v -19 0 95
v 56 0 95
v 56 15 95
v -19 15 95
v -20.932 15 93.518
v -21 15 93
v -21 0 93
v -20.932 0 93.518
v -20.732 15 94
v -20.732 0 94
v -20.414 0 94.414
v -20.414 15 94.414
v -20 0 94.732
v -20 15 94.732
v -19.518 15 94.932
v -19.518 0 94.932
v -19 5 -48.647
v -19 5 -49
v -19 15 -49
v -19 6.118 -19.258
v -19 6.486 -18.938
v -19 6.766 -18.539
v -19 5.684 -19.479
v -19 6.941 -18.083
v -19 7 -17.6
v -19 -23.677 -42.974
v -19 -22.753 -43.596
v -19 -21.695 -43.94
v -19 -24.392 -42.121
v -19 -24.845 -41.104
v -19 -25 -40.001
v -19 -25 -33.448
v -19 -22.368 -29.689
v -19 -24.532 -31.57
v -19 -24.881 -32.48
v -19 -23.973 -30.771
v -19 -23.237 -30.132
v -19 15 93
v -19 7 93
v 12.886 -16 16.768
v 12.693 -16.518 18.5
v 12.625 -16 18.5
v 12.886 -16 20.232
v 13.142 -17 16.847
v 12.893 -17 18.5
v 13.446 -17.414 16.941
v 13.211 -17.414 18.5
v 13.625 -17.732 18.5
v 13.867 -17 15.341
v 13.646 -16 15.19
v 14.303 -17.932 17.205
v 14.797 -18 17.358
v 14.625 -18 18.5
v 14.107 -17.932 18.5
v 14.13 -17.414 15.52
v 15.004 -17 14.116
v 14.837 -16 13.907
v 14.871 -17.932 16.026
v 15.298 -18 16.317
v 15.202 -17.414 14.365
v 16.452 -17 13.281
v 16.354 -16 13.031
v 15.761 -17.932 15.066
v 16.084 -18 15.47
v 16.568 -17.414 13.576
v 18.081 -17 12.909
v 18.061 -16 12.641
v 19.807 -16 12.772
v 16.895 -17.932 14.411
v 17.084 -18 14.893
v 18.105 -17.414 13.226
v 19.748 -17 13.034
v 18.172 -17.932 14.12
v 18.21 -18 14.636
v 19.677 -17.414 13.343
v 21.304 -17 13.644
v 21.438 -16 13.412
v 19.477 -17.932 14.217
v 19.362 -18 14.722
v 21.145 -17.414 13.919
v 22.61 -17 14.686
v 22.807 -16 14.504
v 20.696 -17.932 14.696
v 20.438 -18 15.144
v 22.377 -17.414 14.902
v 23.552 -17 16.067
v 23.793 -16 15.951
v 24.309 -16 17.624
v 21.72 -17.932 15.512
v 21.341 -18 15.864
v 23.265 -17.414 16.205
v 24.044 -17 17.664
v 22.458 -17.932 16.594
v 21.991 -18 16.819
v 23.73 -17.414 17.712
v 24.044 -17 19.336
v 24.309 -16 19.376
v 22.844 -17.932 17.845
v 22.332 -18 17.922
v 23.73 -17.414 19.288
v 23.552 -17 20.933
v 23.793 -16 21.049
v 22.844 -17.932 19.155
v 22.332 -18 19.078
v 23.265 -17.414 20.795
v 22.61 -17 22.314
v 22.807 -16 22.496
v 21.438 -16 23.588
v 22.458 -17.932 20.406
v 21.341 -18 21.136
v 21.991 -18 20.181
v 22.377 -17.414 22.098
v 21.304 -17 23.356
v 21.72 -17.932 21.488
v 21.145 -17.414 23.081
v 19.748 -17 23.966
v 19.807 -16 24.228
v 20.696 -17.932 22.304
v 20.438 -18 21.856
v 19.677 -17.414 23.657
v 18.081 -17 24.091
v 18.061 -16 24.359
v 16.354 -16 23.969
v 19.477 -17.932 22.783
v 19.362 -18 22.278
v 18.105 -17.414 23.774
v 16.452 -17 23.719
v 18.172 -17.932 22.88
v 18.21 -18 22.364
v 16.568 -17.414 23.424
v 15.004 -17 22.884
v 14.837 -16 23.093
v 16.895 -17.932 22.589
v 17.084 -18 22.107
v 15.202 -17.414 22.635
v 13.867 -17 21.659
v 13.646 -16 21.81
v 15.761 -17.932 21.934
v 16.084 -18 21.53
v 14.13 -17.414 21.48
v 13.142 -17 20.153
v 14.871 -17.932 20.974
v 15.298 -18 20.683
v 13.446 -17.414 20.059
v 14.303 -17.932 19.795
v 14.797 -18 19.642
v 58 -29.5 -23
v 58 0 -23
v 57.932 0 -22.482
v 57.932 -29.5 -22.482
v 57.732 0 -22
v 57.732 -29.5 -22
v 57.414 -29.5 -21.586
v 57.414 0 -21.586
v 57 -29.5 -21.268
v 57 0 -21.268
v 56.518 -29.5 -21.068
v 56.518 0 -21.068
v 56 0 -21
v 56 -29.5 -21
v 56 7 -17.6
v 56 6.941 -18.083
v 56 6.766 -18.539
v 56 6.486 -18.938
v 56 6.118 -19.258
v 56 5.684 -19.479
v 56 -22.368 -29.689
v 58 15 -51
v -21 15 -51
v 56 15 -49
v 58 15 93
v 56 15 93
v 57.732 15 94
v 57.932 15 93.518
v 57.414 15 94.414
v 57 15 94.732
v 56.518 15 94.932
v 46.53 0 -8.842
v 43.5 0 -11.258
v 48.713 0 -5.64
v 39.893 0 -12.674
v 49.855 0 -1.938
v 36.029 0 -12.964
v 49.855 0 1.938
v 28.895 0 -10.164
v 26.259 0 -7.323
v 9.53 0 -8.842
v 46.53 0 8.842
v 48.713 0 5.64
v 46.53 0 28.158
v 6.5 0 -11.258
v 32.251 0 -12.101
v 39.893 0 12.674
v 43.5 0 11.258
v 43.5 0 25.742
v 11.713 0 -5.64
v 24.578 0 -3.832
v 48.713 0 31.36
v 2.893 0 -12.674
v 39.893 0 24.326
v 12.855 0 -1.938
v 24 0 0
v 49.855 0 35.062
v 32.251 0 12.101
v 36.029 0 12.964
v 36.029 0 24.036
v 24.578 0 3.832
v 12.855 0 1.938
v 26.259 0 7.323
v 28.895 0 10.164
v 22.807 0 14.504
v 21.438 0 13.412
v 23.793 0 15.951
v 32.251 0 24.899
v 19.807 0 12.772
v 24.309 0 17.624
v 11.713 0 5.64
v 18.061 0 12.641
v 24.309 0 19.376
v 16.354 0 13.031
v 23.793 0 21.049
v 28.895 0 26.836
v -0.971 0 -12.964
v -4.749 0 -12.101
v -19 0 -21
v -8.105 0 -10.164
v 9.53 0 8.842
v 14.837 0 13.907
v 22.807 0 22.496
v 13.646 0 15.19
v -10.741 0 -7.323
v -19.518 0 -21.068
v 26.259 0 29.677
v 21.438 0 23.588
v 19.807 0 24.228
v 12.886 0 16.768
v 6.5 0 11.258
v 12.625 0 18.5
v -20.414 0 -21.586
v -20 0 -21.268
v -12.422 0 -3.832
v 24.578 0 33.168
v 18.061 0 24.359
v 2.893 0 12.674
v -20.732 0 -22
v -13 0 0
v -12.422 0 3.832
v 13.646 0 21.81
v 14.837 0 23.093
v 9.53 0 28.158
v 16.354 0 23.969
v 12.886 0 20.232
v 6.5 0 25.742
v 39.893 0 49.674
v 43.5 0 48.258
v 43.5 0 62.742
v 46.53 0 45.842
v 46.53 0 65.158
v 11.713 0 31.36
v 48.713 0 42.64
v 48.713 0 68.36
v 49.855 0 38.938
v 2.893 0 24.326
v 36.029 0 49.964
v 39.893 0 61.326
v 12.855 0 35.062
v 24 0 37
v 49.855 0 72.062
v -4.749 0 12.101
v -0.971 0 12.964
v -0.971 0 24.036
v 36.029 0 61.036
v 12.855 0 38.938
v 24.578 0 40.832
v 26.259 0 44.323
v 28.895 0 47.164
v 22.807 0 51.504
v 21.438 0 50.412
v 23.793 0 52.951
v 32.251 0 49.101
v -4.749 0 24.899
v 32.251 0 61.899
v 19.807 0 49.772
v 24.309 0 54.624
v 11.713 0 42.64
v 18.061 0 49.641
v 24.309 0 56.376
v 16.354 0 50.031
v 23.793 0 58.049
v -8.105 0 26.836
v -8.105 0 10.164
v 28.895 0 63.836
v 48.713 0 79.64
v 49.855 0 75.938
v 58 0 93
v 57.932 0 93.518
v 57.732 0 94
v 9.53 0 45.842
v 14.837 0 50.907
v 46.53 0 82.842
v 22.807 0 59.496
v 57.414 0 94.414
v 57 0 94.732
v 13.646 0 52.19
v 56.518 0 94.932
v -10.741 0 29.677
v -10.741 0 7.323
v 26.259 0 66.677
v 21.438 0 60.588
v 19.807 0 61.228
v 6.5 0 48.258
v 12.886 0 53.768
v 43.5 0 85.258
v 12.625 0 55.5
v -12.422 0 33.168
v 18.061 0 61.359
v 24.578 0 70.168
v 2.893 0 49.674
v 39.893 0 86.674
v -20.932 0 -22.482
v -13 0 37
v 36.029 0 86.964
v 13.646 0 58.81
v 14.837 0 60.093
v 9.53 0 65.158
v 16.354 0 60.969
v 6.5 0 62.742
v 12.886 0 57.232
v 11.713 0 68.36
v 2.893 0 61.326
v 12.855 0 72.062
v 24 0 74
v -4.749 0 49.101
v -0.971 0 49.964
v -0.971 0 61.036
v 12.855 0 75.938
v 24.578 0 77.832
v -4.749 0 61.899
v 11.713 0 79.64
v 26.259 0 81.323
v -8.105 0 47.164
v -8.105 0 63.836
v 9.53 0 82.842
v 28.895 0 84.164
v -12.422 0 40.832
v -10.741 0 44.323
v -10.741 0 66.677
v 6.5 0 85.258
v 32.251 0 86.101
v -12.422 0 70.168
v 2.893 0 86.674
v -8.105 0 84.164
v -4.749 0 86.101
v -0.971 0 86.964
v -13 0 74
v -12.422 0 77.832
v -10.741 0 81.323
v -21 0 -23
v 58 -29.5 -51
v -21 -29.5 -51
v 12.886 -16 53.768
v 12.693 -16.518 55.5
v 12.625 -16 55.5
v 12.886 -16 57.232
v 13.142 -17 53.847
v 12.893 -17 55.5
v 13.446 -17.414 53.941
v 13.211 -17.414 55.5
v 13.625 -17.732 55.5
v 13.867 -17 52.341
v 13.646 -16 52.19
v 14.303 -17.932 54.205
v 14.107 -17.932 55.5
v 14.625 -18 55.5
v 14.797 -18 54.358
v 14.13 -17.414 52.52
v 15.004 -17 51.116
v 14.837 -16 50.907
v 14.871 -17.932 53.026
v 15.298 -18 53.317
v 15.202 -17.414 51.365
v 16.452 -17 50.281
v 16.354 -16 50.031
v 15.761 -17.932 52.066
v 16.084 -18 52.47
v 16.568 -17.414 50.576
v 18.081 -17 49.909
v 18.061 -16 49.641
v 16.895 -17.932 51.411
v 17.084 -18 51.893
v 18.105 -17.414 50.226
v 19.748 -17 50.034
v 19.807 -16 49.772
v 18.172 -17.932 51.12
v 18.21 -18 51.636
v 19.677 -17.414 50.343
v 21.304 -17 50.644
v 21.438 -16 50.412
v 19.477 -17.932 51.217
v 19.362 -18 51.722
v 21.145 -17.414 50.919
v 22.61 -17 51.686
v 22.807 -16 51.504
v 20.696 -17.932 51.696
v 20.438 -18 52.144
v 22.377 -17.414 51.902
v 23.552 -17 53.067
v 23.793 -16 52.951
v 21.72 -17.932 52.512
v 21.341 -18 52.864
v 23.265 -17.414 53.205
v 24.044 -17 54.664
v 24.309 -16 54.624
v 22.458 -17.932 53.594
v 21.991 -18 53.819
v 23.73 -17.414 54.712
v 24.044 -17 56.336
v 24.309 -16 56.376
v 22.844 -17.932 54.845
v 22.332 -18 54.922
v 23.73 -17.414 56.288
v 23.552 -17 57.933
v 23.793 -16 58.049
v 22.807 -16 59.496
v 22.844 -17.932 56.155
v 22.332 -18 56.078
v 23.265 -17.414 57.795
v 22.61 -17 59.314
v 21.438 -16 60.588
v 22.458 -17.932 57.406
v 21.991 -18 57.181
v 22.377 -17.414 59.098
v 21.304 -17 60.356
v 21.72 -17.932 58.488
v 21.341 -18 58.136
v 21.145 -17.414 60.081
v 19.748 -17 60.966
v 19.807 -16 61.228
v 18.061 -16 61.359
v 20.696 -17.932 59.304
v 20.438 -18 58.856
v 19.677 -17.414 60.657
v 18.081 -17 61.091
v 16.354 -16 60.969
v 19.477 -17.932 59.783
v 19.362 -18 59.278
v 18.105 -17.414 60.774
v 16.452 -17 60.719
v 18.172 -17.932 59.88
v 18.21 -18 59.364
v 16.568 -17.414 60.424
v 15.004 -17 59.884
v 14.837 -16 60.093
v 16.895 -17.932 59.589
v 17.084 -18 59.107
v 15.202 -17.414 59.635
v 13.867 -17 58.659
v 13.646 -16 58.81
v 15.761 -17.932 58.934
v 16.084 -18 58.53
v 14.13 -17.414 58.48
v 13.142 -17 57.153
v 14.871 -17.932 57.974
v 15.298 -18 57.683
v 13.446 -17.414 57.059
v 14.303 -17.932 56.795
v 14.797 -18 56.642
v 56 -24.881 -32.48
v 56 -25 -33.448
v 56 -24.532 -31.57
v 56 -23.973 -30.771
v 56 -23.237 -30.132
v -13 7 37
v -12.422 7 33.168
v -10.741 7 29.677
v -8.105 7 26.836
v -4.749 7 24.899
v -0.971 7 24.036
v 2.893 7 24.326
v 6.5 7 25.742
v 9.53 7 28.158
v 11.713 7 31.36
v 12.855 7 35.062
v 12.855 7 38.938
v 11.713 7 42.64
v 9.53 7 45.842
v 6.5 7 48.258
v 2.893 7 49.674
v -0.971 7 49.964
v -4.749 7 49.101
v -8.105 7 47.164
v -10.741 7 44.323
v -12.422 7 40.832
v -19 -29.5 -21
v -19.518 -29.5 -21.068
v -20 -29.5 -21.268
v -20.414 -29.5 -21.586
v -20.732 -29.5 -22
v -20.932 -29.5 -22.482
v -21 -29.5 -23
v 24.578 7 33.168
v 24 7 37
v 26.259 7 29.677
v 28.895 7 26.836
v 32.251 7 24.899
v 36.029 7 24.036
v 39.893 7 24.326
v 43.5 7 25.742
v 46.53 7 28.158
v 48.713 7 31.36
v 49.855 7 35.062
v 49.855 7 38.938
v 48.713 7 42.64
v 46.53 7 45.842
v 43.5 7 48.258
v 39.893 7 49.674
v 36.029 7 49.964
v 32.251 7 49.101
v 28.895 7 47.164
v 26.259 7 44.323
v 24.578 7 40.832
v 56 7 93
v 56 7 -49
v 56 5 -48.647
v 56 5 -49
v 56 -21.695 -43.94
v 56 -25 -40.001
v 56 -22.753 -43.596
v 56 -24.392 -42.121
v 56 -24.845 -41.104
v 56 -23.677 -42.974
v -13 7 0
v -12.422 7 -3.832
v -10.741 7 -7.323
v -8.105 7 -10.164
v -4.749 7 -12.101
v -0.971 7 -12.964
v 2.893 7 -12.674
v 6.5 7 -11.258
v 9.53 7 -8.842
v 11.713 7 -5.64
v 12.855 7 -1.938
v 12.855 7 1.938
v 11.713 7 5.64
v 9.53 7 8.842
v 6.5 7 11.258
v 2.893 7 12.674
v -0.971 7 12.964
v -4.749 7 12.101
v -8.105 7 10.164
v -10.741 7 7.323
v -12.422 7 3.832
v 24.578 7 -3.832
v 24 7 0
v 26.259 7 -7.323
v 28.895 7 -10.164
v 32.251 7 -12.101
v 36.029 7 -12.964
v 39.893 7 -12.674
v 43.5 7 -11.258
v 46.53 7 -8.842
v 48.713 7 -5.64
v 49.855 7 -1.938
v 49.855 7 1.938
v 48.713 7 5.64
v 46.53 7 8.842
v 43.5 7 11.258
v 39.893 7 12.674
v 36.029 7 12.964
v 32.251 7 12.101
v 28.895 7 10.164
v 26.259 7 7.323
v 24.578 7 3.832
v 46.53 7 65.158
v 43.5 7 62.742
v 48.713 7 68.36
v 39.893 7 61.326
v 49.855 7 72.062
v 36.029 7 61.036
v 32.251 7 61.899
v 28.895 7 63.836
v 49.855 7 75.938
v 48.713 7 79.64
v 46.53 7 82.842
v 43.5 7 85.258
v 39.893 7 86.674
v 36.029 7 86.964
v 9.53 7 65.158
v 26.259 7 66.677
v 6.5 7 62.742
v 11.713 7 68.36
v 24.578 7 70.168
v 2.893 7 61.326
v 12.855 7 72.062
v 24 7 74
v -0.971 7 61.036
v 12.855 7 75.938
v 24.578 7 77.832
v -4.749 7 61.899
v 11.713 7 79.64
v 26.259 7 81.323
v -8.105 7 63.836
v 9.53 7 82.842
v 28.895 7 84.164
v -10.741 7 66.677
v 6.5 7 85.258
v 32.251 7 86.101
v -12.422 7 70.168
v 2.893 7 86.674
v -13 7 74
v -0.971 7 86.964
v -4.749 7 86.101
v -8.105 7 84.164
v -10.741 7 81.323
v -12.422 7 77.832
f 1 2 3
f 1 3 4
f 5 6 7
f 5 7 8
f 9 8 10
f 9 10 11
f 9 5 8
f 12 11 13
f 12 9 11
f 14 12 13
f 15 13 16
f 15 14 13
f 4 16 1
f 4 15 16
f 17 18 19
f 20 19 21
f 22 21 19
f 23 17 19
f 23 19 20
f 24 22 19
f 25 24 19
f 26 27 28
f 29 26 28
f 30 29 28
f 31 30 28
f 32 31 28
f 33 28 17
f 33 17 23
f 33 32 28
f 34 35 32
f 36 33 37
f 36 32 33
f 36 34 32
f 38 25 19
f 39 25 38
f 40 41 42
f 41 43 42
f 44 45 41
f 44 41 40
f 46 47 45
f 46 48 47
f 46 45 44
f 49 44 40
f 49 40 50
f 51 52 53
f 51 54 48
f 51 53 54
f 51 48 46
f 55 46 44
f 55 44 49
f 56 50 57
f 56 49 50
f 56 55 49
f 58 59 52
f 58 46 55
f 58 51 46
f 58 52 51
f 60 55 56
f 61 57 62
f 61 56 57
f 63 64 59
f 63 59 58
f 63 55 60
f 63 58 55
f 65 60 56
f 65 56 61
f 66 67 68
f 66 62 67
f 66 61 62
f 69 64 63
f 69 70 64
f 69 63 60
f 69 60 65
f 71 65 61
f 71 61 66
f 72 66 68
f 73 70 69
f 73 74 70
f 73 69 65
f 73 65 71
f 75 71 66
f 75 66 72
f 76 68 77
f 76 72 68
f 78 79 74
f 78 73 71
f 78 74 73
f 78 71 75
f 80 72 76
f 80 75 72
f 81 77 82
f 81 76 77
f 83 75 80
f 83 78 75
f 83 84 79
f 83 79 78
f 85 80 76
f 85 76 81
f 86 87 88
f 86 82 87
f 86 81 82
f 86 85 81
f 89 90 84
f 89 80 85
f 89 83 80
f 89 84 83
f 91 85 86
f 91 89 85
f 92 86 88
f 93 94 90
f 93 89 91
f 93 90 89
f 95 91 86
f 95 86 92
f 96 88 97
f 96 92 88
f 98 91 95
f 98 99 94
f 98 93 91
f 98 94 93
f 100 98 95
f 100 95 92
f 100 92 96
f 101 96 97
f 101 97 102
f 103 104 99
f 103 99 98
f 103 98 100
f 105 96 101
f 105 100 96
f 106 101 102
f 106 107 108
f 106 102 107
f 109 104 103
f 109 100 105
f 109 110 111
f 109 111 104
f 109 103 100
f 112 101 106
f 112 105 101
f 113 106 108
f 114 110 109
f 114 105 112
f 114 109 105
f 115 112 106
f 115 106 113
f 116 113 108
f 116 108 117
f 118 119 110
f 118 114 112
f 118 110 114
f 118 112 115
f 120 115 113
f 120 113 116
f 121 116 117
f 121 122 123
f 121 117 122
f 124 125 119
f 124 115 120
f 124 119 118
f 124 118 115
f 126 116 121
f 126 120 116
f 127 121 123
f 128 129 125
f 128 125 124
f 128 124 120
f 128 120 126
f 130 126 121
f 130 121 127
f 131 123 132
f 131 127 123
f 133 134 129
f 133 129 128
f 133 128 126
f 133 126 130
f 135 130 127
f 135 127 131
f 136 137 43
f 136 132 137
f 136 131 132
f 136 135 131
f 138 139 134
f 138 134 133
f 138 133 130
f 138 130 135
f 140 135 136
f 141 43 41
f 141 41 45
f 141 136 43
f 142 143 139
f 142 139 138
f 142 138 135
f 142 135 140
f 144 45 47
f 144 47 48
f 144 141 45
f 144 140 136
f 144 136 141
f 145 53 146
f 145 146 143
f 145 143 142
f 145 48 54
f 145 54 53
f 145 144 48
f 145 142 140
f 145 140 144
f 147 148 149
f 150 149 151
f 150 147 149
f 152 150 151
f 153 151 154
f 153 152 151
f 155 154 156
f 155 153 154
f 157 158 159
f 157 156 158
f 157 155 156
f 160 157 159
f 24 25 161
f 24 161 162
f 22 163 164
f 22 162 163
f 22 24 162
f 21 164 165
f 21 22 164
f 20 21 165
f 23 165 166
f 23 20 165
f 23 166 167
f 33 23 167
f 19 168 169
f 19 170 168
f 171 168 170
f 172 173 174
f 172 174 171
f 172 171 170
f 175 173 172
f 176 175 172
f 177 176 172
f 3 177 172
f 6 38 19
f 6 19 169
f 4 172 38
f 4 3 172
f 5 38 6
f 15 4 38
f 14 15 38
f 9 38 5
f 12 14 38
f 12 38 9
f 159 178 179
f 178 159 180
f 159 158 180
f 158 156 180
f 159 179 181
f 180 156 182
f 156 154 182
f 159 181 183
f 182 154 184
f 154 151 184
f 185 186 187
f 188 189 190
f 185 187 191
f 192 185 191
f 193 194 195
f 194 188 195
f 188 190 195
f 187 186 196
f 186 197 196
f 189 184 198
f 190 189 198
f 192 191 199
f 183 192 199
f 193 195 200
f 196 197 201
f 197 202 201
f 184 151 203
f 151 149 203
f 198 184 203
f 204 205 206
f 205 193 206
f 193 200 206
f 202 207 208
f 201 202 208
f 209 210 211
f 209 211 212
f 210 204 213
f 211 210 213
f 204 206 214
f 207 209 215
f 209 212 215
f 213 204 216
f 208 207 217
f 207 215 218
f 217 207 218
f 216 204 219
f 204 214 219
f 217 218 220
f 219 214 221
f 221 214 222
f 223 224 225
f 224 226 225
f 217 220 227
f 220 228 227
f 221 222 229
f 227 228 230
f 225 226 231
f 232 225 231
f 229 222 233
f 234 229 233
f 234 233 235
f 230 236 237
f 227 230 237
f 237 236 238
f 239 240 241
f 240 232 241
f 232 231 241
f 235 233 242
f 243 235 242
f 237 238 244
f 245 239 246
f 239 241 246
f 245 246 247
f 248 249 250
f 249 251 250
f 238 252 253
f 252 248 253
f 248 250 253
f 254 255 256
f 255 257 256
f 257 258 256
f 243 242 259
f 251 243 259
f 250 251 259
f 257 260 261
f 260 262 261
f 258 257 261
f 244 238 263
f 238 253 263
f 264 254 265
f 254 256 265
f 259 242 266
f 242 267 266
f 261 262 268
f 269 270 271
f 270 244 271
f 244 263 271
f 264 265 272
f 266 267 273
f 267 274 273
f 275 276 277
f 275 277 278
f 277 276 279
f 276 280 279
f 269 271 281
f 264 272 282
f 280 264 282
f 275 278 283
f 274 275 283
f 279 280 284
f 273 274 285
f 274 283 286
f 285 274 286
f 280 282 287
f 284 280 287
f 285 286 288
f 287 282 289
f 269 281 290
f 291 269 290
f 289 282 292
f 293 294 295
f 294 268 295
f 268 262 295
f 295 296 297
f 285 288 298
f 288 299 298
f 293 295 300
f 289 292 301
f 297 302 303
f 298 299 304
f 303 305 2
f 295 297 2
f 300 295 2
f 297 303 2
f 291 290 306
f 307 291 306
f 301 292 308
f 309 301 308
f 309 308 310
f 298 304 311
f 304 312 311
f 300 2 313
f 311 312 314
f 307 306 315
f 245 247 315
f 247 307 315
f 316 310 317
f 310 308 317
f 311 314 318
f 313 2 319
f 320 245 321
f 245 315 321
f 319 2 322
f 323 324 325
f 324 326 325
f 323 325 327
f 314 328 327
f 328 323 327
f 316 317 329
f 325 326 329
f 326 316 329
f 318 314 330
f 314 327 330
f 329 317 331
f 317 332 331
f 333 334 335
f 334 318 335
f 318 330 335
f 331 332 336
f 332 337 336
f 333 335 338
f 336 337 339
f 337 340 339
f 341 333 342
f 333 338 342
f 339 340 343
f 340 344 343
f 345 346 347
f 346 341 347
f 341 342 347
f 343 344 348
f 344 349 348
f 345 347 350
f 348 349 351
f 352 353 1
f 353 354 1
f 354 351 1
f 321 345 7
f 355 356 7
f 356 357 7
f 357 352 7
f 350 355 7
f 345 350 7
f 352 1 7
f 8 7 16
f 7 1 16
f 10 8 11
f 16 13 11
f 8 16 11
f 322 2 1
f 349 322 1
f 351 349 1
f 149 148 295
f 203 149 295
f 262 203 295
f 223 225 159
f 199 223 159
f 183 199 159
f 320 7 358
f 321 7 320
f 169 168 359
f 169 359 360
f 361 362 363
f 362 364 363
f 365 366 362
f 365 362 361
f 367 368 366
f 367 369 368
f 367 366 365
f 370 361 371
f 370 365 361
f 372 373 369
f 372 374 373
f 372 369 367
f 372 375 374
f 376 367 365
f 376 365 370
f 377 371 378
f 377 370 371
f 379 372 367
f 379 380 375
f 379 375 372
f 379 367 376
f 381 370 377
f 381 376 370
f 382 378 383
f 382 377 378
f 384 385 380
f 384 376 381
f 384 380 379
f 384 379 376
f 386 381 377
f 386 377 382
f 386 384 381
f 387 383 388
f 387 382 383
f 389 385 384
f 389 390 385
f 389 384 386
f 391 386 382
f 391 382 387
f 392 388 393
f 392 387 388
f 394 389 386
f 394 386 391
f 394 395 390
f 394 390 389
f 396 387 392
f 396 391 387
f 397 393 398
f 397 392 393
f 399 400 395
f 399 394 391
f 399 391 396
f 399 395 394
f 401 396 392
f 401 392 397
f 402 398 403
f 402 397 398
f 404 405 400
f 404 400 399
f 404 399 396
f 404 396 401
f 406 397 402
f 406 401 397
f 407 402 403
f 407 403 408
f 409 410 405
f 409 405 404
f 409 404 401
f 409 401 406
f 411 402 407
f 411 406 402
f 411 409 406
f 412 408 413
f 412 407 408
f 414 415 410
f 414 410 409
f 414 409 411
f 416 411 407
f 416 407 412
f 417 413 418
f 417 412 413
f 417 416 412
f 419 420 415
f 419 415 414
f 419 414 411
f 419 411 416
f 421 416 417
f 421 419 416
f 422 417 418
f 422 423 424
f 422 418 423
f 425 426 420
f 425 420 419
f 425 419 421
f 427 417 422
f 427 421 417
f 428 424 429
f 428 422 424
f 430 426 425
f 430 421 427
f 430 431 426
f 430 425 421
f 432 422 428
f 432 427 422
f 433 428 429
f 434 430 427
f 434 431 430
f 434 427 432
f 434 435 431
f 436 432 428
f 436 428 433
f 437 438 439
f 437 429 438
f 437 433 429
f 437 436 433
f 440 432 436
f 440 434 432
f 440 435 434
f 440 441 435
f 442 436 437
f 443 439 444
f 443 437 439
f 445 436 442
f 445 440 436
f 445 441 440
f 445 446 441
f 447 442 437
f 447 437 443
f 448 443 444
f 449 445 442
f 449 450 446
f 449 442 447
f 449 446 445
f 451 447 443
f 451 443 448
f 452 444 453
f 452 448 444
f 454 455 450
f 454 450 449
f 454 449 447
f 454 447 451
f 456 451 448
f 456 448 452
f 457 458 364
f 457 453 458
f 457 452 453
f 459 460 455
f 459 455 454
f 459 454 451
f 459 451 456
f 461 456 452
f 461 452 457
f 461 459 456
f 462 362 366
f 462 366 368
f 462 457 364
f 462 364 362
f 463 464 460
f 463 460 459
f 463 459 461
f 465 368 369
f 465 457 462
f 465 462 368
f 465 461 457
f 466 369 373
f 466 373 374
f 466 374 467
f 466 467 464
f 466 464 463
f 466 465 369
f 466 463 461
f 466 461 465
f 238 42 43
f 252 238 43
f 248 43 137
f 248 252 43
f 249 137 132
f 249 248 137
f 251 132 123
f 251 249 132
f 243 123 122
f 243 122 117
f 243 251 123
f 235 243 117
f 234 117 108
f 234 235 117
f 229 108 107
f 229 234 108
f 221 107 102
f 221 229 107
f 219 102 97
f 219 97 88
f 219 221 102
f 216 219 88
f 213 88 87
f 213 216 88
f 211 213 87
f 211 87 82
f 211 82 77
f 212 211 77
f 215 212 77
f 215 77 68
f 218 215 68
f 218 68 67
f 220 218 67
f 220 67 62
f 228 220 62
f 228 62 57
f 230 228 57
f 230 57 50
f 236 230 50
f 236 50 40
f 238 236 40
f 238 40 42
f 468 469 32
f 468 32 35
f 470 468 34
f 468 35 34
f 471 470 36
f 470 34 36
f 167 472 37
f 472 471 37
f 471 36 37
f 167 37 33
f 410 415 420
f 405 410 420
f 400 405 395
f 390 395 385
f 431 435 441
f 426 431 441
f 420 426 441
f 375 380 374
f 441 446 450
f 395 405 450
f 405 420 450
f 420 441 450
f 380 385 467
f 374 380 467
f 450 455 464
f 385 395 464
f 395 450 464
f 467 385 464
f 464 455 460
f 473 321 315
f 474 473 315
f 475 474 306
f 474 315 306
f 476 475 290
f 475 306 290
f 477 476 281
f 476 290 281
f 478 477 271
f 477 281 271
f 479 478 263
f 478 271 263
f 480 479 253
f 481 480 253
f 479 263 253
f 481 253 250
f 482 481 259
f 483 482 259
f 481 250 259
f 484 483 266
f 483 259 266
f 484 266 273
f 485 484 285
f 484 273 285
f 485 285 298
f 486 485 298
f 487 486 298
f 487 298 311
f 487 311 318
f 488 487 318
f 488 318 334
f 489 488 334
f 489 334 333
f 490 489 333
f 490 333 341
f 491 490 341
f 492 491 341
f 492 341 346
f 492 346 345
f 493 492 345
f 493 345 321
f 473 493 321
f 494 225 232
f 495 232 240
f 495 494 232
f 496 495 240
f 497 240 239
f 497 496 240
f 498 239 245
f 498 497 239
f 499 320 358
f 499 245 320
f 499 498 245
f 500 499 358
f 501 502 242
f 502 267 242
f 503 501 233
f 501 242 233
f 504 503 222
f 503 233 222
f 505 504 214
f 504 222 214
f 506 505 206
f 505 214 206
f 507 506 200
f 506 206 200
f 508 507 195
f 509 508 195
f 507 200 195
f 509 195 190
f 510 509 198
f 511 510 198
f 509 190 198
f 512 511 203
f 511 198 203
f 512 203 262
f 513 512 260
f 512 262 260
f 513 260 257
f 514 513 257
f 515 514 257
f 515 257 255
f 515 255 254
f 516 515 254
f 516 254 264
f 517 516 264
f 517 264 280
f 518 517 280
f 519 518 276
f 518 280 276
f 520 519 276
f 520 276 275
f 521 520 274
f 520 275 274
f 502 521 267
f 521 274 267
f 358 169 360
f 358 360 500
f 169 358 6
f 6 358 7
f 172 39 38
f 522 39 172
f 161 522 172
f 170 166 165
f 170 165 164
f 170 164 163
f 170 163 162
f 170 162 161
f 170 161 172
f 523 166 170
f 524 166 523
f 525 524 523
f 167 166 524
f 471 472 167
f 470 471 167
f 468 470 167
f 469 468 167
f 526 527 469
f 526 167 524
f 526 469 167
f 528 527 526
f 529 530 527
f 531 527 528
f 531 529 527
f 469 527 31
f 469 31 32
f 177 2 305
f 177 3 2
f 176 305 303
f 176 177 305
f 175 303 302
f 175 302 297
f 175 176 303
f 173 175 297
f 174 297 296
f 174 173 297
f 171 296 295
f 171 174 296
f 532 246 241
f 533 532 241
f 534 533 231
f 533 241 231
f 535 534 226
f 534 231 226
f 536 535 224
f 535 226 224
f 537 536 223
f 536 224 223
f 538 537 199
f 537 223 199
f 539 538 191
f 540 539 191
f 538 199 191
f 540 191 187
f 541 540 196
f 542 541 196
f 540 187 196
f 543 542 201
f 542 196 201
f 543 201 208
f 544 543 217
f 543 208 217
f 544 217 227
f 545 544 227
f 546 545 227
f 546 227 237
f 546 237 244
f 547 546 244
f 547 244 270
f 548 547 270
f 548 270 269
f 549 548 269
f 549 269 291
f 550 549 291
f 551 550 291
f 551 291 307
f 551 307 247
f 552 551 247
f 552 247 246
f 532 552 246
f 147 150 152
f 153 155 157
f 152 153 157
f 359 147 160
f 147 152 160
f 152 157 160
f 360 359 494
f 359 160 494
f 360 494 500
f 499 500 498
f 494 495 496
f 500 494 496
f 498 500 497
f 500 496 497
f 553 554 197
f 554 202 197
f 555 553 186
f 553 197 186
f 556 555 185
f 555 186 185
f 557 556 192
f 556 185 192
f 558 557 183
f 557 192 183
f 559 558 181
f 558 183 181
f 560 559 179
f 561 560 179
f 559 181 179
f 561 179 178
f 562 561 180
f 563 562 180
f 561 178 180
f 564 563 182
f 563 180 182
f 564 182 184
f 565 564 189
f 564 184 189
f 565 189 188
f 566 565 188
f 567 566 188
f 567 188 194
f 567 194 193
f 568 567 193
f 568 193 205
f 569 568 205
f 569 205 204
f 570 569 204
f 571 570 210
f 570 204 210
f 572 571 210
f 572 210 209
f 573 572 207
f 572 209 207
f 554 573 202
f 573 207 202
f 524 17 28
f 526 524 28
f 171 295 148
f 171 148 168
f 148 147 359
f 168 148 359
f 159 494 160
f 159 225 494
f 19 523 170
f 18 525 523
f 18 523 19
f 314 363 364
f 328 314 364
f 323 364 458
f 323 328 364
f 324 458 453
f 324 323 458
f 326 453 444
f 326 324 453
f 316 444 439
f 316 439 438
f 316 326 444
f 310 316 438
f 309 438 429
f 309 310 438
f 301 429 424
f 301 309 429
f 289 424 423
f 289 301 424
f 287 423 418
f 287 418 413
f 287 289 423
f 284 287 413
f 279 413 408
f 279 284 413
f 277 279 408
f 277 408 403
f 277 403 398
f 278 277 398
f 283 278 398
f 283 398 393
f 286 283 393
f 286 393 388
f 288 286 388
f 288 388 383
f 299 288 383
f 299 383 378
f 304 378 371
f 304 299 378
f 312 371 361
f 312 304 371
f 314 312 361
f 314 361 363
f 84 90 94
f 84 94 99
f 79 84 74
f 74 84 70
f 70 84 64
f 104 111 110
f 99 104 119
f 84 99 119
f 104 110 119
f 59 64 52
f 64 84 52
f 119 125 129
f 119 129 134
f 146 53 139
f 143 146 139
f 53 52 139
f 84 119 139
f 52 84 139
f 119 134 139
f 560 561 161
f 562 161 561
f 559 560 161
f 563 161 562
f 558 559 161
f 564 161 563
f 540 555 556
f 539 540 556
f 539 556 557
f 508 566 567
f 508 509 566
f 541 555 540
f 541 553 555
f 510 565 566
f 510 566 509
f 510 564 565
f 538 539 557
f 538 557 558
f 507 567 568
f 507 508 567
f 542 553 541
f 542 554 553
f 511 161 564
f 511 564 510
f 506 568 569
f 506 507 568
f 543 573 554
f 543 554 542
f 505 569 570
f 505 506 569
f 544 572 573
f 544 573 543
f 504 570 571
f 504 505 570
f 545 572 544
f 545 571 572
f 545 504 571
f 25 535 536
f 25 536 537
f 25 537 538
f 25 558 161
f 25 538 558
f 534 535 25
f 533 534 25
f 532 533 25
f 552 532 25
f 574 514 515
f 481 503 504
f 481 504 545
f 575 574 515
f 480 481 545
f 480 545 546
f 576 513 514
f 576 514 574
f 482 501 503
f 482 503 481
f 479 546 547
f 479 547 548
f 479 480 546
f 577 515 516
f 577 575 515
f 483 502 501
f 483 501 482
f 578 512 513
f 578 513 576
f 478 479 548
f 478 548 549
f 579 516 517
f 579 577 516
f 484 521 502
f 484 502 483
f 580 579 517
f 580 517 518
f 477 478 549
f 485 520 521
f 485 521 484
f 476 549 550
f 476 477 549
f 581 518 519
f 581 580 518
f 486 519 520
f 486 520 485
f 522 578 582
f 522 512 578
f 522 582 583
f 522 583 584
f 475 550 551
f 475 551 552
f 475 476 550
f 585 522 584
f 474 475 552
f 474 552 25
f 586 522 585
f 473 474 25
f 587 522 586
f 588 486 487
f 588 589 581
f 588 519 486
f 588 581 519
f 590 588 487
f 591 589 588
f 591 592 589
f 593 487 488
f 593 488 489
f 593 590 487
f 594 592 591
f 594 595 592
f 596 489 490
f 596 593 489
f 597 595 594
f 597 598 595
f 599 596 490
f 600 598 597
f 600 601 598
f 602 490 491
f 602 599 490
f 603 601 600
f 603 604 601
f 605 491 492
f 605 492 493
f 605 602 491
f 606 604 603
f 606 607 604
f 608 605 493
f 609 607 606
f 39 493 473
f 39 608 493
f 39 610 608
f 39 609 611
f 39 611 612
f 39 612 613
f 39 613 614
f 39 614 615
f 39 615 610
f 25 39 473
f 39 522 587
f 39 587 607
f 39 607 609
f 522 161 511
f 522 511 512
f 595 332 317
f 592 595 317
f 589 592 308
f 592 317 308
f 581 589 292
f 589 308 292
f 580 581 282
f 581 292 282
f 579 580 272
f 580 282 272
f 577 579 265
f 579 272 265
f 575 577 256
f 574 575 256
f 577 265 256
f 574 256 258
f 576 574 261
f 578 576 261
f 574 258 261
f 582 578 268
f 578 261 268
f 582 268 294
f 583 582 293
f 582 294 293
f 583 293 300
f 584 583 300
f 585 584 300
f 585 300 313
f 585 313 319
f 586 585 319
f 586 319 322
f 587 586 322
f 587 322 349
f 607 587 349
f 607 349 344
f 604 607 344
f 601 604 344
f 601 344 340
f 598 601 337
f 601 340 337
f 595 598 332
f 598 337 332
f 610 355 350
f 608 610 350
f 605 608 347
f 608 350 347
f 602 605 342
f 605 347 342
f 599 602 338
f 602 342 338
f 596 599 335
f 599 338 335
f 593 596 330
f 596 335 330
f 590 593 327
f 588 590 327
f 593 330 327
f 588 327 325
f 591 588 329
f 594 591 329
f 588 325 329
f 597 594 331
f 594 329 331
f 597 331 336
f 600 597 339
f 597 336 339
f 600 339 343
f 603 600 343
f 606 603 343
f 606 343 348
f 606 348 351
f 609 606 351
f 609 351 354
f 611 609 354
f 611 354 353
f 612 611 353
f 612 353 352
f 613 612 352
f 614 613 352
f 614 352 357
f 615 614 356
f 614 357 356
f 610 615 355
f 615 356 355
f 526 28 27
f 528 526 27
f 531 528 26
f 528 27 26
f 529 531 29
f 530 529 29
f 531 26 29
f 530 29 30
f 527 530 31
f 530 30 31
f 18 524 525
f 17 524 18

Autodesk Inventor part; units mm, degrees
ref_plane "YZ Plane" through (0, 0, 0) normal (1, 0, 0) x (0, 1, 0)
ref_plane "XY Plane" through (0, 0, 0) normal (0, 0, 1) x (1, 0, 0)
sketch "Sketch1" plane through (0, 0, 0) normal (0, 1, 0) x (-1, 0, 0)
  line L0 (25.9, 0) -> (-25.9, 0) projected
  line L1 (0, -25.9) -> (0, 25.9) projected
  circle A0 centre (0, 0) radius 18.5 construction
  circle A1 centre (0, 0) radius 13 construction
  dimension "d0" = 37
  dimension "d1" = 26
sketch "Sketch2" plane through (0, 0, 0) normal (0, 1, 0) x (-1, 0, 0)
  line L0 (36.8, 0) -> (-73.8, 0) projected
  line L1 (0, -44.2) -> (0, 118.2) projected
  line L2 (-58, 95) -> (-58, -21)
  line L3 (-58, -21) -> (21, -21)
  line L4 (21, -21) -> (21, 95)
  line L5 (-58, 95) -> (21, 95)
  circle A0 centre (-37, 0) radius 18.5 construction
  circle A1 centre (-37, 37) radius 18.5 construction
  circle A2 centre (-37, 74) radius 18.5 construction
  point P0 (0, 0)
  dimension "d29" = 21
  dimension "d30" = 95
  dimension "d109" = 58
  dimension "d110" = 21
  dimension "d111" = 37
  dimension "d112" = 37
  dimension "d113" = 37
  dimension "d114" = 37
  dimension "d115" = 37
  dimension "d116" = 37
  dimension "d117" = 37
  dimension "d118" = 37
extrude "Extrusion1" add sketch "Sketch2" along normal blind 7
sketch "Sketch6" plane through (0, 0, 0) normal (0, 1, 0) x (-1, 0, 0)
  line L0 (21, -21) -> (-58, -21) projected
  line L1 (21, 95) -> (21, -21) projected
  line L2 (-58, -21) -> (21, -21)
  line L3 (21, -21) -> (21, 95)
  line L4 (-58, 95) -> (-58, -21)
  line L5 (80.1765, 0) -> (-86.8627, 0) projected
  line L6 (0, -44.2) -> (0, 118.2) projected
  line L7 (21, 95) -> (-58, 95) projected
  line L8 (-53, 95) -> (-53, 0)
  line L9 (53, 0) -> (53, 95)
  line L10 (53, 95) -> (21, 95)
  line L11 (-58, 95) -> (-58, -21) projected
  line L12 (-58, 95) -> (-53, 95)
  arc A0 (37, -16) -> (53, 0) centre (37, 0) ccw
  arc A1 (-53, 0) -> (-37, -16) centre (-37, 0) ccw
  line L13 (37, -16) -> (-39.8141, -16)
  point P0 (0, 0)
  point P1 (-16, 0)
  dimension "d101" = 53
  dimension "d102" = 53
  dimension "d103" = 32
  dimension "d104" = 32
extrude "Extrusion5" [suppressed]
sketch "Sketch4" plane through (0, 0, 0) normal (0, 0, 1) x (1, 0, 0)
  line L0 (-55.5, 0) -> (55.5, 0)
  line L1 (55.5, 0) -> (55.5, -2.5)
  line L2 (55.5, -2.5) -> (-55.5, -2.5)
  line L3 (-55.5, -2.5) -> (-55.5, 0)
  line L4 (-77.7, 0) -> (77.7, 0) projected
  line L5 (0, -3) -> (0, 0.5) projected
  point P0 (0, 0)
  dimension "d10" = 111
  dimension "d11" = 2.5
extrude "Extrusion6" [suppressed]
sketch "Sketch5" plane through (0, 0, 0) normal (0, 1, 0) x (-1, 0, 0)
  circle A0 centre (0, 0) radius 18.5 construction
  circle A1 centre (0, 0) radius 18.5 construction
  line L0 (77.7, 0) -> (-77.7, 0) projected
  line L1 (0, -28.9) -> (0, 26.4) projected
  line L2 (-55.5, -21) -> (55.5, -21)
  line L3 (55.5, -21) -> (55.5, -18.5)
  line L4 (55.5, -18.5) -> (-55.5, -18.5)
  line L5 (-55.5, -18.5) -> (-55.5, -21)
  dimension "d25" = 111
  dimension "d26" = 21
extrude "Extrusion7" [suppressed]
sketch "Sketch7" plane through (0, 0, 0) normal (0, 0, 1) x (1, 0, 0)
  line L0 (-55.5, 0) -> (55.5, 0)
  line L1 (55.5, 0) -> (55.5, -2.5)
  line L2 (55.5, -2.5) -> (-55.5, -2.5)
  line L3 (-55.5, -2.5) -> (-55.5, 0)
  line L4 (58, 0) -> (-21, 0) projected
  line L5 (-79.2, 0) -> (86.7, 0) projected
  line L6 (0, -3) -> (0, 0.5) projected
  point P0 (-16, 0)
  point P1 (16, 0)
  point P2 (53, 0)
  point P3 (-53, 0)
  dimension "d53" = 2.5
  dimension "d54" = 55.5
extrude "Extrusion8" [suppressed]
sketch "Sketch8" plane through (0, 0, 0) normal (0, 1, 0) x (-1, 0, 0)
  circle A0 centre (0, 0) radius 13
  dimension "d34" = 26
extrude "Extrusion9" cut sketch "Sketch8" along normal through all
pattern_linear "Rectangular Pattern1" count 3 spacing 37 along (0, 0, 1) count 2 spacing 37 along (1, 0, 0) of "Extrusion9"
sketch "Sketch9" plane through (0, 7, 0) normal (0, 1, 0) x (1, 0, 0)
  circle A0 centre (0, 0) radius 13
  circle A1 centre (0, 0) radius 15
  dimension "d40" = 26
  dimension "d41" = 30
extrude "Extrusion10" [suppressed]
sketch "Sketch10" plane through (0, 5, 0) normal (0, 1, 0) x (1, 0, 0)
  arc A0 (16, 0) -> (-16, 0) centre (0, 0) ccw projected
  line L0 (1.5, -18) -> (-1.5, -18)
  line L1 (-29.4, 0) -> (29.4, 0) projected
  line L2 (0, 36.3) -> (0, -70.8) projected
  line L3 (1.5, -12) -> (-1.5, -12)
  line L4 (1.5, -12) -> (1.5, -18)
  line L5 (-1.5, -18) -> (-1.5, -12)
  dimension "d48" = 3
  dimension "d49" = 12
  dimension "d50" = 6
extrude "Extrusion11" [suppressed]
ref_plane "Work Plane1" through (0, 5, 0) normal (0, 1, 0) x (-1, 0, 0)
sketch "Sketch12" plane through (0, 5, 0) normal (0, 1, 0) x (-1, 0, 0)
  line L0 (21, -21) -> (-58, -21)
  line L1 (-58, -21) -> (-58, -51)
  line L2 (-58, -51) -> (21, -51)
  line L3 (21, -51) -> (21, -21)
  line L4 (43.8, 0) -> (-80.8, 0) projected
  line L5 (0, -64.9) -> (0, 32.4) projected
  point P0 (0, 0)
  dimension "d62" = 30
  dimension "d123" = 58
  dimension "d124" = 21
  dimension "d125" = 21
extrude "Extrusion12" add sketch "Sketch12" against normal blind 34.5
sketch "Sketch13" plane through (0, 0, 0) normal (1, 0, 0) x (0, 1, 0)
  line L0 (-31.4, 0) -> (13.4, 0) projected
  line L1 (0, -62.5) -> (0, 32) projected
  line L2 (7, -19) -> (7, -49)
  line L3 (7, -49) -> (-25, -43.3575)
  line L4 (-25, -43.3575) -> (-25, -30.647)
  line L5 (7, -19) -> (-25, -30.647)
  point P0 (0, 0)
  dimension "d85" = 25
  dimension "d86" = 7
  dimension "d87" = 49
  dimension "d88" = 30
  dimension "d89" = 100
  dimension "d90" = 110
extrude "Extrusion14" cut sketch "Sketch13" against normal blind 19
sketch "Sketch14" plane through (0, 5, 0) normal (0, 1, 0) x (-1, 0, 0)
  line L0 (0, -80.2) -> (0, 124.2) projected
  line L1 (19, 93) -> (-56, 93)
  line L2 (-56, 93) -> (-56, -49)
  line L3 (-56, -49) -> (19, -49)
  line L4 (19, -49) -> (19, 93)
  line L5 (21, 95) -> (-58, 95)
  line L6 (-58, 95) -> (-58, -51)
  line L7 (-58, -51) -> (21, -51)
  line L8 (21, -51) -> (21, 95)
  line L9 (43.8, 0) -> (-80.8, 0) projected
  dimension "d91" = 51
  dimension "d92" = 95
  dimension "d95" = 93
  dimension "d96" = 49
  dimension "d119" = 58
  dimension "d120" = 21
  dimension "d121" = 56
  dimension "d122" = 19
extrude "Extrusion15" add sketch "Sketch14" along normal blind 10 contours L7 L6 L9 L2 L3 L0 | L0 L3 L4 L9 L8 L7 | L6 L5 L0 L1 L2 L9 | L9 L4 L1 L0 L5 L8
fillet "Fillet3" radius 2 2 edges at (58, 7.5, 95) (-21, 7.5, 95)
fillet "Fillet5" radius 2 2 edges at (58, -14.75, -21) (-21, -14.75, -21)
fillet "Fillet8" [suppressed]
extrude "Extrusion16" cut sketch "Sketch13" along normal blind 56
sketch "Sketch15" plane through (0, 0, 0) normal (0, 1, 0) x (-1, 0, 0)
  circle A0 centre (-18.5, 18.5) radius 5.875
  line L0 (27.075, 0) -> (-32.95, 0) projected
  line L1 (0, -34.475) -> (0, 77.35) projected
  circle A1 centre (-18.5, 55.5) radius 5.875
  point P0 (0, 0)
  dimension "d128" = 18.5
  dimension "d129" = 18.5
  dimension "d130" = 11.75
  dimension "d133" = 37
extrude "Extrusion17" add sketch "Sketch15" against normal blind 18
fillet "Fillet9" radius 2 2 edges at (24.375, -18, 55.5) (24.375, -18, 18.5)
fillet "Fillet10" radius 4 2 edges at (18.5, -25, -43.3575) (18.5, -25, -30.647)
fillet "Fillet11" radius 2 1 edges at (18.5, 7, -19)
sketch "Sketch16" plane through (-19, 0, 0) normal (1, 0, 0) x (0, 0, -1)
  circle A0 centre (34.9178, 2) radius 13
  line L0 (48.6473, 5) -> (43.9404, -21.6946) projected
  line L1 (-93, 15) -> (49, 15) projected
  line L2 (49.4247, 14.4011) -> (38.404, -16.7639)
  line L3 (38.404, -16.7639) -> (16.9247, 8.3628)
  line L4 (16.9247, 8.3628) -> (49.4247, 14.4011)
  line L5 (49, 5) -> (49, 15) projected
  line L6 (49, 11.3819) -> (46.2939, 13.8194)
  point P0 (0, 0)
  dimension "d163" = 26
  dimension "d164" = 32.5
equation "\"d115\" = d114"
equation "\"d117\" = d116"
equation "\"d118\" = d115"
equation "\"d102\" = d101"
properties part number "NespressoSpeedfiller-6X-long"
